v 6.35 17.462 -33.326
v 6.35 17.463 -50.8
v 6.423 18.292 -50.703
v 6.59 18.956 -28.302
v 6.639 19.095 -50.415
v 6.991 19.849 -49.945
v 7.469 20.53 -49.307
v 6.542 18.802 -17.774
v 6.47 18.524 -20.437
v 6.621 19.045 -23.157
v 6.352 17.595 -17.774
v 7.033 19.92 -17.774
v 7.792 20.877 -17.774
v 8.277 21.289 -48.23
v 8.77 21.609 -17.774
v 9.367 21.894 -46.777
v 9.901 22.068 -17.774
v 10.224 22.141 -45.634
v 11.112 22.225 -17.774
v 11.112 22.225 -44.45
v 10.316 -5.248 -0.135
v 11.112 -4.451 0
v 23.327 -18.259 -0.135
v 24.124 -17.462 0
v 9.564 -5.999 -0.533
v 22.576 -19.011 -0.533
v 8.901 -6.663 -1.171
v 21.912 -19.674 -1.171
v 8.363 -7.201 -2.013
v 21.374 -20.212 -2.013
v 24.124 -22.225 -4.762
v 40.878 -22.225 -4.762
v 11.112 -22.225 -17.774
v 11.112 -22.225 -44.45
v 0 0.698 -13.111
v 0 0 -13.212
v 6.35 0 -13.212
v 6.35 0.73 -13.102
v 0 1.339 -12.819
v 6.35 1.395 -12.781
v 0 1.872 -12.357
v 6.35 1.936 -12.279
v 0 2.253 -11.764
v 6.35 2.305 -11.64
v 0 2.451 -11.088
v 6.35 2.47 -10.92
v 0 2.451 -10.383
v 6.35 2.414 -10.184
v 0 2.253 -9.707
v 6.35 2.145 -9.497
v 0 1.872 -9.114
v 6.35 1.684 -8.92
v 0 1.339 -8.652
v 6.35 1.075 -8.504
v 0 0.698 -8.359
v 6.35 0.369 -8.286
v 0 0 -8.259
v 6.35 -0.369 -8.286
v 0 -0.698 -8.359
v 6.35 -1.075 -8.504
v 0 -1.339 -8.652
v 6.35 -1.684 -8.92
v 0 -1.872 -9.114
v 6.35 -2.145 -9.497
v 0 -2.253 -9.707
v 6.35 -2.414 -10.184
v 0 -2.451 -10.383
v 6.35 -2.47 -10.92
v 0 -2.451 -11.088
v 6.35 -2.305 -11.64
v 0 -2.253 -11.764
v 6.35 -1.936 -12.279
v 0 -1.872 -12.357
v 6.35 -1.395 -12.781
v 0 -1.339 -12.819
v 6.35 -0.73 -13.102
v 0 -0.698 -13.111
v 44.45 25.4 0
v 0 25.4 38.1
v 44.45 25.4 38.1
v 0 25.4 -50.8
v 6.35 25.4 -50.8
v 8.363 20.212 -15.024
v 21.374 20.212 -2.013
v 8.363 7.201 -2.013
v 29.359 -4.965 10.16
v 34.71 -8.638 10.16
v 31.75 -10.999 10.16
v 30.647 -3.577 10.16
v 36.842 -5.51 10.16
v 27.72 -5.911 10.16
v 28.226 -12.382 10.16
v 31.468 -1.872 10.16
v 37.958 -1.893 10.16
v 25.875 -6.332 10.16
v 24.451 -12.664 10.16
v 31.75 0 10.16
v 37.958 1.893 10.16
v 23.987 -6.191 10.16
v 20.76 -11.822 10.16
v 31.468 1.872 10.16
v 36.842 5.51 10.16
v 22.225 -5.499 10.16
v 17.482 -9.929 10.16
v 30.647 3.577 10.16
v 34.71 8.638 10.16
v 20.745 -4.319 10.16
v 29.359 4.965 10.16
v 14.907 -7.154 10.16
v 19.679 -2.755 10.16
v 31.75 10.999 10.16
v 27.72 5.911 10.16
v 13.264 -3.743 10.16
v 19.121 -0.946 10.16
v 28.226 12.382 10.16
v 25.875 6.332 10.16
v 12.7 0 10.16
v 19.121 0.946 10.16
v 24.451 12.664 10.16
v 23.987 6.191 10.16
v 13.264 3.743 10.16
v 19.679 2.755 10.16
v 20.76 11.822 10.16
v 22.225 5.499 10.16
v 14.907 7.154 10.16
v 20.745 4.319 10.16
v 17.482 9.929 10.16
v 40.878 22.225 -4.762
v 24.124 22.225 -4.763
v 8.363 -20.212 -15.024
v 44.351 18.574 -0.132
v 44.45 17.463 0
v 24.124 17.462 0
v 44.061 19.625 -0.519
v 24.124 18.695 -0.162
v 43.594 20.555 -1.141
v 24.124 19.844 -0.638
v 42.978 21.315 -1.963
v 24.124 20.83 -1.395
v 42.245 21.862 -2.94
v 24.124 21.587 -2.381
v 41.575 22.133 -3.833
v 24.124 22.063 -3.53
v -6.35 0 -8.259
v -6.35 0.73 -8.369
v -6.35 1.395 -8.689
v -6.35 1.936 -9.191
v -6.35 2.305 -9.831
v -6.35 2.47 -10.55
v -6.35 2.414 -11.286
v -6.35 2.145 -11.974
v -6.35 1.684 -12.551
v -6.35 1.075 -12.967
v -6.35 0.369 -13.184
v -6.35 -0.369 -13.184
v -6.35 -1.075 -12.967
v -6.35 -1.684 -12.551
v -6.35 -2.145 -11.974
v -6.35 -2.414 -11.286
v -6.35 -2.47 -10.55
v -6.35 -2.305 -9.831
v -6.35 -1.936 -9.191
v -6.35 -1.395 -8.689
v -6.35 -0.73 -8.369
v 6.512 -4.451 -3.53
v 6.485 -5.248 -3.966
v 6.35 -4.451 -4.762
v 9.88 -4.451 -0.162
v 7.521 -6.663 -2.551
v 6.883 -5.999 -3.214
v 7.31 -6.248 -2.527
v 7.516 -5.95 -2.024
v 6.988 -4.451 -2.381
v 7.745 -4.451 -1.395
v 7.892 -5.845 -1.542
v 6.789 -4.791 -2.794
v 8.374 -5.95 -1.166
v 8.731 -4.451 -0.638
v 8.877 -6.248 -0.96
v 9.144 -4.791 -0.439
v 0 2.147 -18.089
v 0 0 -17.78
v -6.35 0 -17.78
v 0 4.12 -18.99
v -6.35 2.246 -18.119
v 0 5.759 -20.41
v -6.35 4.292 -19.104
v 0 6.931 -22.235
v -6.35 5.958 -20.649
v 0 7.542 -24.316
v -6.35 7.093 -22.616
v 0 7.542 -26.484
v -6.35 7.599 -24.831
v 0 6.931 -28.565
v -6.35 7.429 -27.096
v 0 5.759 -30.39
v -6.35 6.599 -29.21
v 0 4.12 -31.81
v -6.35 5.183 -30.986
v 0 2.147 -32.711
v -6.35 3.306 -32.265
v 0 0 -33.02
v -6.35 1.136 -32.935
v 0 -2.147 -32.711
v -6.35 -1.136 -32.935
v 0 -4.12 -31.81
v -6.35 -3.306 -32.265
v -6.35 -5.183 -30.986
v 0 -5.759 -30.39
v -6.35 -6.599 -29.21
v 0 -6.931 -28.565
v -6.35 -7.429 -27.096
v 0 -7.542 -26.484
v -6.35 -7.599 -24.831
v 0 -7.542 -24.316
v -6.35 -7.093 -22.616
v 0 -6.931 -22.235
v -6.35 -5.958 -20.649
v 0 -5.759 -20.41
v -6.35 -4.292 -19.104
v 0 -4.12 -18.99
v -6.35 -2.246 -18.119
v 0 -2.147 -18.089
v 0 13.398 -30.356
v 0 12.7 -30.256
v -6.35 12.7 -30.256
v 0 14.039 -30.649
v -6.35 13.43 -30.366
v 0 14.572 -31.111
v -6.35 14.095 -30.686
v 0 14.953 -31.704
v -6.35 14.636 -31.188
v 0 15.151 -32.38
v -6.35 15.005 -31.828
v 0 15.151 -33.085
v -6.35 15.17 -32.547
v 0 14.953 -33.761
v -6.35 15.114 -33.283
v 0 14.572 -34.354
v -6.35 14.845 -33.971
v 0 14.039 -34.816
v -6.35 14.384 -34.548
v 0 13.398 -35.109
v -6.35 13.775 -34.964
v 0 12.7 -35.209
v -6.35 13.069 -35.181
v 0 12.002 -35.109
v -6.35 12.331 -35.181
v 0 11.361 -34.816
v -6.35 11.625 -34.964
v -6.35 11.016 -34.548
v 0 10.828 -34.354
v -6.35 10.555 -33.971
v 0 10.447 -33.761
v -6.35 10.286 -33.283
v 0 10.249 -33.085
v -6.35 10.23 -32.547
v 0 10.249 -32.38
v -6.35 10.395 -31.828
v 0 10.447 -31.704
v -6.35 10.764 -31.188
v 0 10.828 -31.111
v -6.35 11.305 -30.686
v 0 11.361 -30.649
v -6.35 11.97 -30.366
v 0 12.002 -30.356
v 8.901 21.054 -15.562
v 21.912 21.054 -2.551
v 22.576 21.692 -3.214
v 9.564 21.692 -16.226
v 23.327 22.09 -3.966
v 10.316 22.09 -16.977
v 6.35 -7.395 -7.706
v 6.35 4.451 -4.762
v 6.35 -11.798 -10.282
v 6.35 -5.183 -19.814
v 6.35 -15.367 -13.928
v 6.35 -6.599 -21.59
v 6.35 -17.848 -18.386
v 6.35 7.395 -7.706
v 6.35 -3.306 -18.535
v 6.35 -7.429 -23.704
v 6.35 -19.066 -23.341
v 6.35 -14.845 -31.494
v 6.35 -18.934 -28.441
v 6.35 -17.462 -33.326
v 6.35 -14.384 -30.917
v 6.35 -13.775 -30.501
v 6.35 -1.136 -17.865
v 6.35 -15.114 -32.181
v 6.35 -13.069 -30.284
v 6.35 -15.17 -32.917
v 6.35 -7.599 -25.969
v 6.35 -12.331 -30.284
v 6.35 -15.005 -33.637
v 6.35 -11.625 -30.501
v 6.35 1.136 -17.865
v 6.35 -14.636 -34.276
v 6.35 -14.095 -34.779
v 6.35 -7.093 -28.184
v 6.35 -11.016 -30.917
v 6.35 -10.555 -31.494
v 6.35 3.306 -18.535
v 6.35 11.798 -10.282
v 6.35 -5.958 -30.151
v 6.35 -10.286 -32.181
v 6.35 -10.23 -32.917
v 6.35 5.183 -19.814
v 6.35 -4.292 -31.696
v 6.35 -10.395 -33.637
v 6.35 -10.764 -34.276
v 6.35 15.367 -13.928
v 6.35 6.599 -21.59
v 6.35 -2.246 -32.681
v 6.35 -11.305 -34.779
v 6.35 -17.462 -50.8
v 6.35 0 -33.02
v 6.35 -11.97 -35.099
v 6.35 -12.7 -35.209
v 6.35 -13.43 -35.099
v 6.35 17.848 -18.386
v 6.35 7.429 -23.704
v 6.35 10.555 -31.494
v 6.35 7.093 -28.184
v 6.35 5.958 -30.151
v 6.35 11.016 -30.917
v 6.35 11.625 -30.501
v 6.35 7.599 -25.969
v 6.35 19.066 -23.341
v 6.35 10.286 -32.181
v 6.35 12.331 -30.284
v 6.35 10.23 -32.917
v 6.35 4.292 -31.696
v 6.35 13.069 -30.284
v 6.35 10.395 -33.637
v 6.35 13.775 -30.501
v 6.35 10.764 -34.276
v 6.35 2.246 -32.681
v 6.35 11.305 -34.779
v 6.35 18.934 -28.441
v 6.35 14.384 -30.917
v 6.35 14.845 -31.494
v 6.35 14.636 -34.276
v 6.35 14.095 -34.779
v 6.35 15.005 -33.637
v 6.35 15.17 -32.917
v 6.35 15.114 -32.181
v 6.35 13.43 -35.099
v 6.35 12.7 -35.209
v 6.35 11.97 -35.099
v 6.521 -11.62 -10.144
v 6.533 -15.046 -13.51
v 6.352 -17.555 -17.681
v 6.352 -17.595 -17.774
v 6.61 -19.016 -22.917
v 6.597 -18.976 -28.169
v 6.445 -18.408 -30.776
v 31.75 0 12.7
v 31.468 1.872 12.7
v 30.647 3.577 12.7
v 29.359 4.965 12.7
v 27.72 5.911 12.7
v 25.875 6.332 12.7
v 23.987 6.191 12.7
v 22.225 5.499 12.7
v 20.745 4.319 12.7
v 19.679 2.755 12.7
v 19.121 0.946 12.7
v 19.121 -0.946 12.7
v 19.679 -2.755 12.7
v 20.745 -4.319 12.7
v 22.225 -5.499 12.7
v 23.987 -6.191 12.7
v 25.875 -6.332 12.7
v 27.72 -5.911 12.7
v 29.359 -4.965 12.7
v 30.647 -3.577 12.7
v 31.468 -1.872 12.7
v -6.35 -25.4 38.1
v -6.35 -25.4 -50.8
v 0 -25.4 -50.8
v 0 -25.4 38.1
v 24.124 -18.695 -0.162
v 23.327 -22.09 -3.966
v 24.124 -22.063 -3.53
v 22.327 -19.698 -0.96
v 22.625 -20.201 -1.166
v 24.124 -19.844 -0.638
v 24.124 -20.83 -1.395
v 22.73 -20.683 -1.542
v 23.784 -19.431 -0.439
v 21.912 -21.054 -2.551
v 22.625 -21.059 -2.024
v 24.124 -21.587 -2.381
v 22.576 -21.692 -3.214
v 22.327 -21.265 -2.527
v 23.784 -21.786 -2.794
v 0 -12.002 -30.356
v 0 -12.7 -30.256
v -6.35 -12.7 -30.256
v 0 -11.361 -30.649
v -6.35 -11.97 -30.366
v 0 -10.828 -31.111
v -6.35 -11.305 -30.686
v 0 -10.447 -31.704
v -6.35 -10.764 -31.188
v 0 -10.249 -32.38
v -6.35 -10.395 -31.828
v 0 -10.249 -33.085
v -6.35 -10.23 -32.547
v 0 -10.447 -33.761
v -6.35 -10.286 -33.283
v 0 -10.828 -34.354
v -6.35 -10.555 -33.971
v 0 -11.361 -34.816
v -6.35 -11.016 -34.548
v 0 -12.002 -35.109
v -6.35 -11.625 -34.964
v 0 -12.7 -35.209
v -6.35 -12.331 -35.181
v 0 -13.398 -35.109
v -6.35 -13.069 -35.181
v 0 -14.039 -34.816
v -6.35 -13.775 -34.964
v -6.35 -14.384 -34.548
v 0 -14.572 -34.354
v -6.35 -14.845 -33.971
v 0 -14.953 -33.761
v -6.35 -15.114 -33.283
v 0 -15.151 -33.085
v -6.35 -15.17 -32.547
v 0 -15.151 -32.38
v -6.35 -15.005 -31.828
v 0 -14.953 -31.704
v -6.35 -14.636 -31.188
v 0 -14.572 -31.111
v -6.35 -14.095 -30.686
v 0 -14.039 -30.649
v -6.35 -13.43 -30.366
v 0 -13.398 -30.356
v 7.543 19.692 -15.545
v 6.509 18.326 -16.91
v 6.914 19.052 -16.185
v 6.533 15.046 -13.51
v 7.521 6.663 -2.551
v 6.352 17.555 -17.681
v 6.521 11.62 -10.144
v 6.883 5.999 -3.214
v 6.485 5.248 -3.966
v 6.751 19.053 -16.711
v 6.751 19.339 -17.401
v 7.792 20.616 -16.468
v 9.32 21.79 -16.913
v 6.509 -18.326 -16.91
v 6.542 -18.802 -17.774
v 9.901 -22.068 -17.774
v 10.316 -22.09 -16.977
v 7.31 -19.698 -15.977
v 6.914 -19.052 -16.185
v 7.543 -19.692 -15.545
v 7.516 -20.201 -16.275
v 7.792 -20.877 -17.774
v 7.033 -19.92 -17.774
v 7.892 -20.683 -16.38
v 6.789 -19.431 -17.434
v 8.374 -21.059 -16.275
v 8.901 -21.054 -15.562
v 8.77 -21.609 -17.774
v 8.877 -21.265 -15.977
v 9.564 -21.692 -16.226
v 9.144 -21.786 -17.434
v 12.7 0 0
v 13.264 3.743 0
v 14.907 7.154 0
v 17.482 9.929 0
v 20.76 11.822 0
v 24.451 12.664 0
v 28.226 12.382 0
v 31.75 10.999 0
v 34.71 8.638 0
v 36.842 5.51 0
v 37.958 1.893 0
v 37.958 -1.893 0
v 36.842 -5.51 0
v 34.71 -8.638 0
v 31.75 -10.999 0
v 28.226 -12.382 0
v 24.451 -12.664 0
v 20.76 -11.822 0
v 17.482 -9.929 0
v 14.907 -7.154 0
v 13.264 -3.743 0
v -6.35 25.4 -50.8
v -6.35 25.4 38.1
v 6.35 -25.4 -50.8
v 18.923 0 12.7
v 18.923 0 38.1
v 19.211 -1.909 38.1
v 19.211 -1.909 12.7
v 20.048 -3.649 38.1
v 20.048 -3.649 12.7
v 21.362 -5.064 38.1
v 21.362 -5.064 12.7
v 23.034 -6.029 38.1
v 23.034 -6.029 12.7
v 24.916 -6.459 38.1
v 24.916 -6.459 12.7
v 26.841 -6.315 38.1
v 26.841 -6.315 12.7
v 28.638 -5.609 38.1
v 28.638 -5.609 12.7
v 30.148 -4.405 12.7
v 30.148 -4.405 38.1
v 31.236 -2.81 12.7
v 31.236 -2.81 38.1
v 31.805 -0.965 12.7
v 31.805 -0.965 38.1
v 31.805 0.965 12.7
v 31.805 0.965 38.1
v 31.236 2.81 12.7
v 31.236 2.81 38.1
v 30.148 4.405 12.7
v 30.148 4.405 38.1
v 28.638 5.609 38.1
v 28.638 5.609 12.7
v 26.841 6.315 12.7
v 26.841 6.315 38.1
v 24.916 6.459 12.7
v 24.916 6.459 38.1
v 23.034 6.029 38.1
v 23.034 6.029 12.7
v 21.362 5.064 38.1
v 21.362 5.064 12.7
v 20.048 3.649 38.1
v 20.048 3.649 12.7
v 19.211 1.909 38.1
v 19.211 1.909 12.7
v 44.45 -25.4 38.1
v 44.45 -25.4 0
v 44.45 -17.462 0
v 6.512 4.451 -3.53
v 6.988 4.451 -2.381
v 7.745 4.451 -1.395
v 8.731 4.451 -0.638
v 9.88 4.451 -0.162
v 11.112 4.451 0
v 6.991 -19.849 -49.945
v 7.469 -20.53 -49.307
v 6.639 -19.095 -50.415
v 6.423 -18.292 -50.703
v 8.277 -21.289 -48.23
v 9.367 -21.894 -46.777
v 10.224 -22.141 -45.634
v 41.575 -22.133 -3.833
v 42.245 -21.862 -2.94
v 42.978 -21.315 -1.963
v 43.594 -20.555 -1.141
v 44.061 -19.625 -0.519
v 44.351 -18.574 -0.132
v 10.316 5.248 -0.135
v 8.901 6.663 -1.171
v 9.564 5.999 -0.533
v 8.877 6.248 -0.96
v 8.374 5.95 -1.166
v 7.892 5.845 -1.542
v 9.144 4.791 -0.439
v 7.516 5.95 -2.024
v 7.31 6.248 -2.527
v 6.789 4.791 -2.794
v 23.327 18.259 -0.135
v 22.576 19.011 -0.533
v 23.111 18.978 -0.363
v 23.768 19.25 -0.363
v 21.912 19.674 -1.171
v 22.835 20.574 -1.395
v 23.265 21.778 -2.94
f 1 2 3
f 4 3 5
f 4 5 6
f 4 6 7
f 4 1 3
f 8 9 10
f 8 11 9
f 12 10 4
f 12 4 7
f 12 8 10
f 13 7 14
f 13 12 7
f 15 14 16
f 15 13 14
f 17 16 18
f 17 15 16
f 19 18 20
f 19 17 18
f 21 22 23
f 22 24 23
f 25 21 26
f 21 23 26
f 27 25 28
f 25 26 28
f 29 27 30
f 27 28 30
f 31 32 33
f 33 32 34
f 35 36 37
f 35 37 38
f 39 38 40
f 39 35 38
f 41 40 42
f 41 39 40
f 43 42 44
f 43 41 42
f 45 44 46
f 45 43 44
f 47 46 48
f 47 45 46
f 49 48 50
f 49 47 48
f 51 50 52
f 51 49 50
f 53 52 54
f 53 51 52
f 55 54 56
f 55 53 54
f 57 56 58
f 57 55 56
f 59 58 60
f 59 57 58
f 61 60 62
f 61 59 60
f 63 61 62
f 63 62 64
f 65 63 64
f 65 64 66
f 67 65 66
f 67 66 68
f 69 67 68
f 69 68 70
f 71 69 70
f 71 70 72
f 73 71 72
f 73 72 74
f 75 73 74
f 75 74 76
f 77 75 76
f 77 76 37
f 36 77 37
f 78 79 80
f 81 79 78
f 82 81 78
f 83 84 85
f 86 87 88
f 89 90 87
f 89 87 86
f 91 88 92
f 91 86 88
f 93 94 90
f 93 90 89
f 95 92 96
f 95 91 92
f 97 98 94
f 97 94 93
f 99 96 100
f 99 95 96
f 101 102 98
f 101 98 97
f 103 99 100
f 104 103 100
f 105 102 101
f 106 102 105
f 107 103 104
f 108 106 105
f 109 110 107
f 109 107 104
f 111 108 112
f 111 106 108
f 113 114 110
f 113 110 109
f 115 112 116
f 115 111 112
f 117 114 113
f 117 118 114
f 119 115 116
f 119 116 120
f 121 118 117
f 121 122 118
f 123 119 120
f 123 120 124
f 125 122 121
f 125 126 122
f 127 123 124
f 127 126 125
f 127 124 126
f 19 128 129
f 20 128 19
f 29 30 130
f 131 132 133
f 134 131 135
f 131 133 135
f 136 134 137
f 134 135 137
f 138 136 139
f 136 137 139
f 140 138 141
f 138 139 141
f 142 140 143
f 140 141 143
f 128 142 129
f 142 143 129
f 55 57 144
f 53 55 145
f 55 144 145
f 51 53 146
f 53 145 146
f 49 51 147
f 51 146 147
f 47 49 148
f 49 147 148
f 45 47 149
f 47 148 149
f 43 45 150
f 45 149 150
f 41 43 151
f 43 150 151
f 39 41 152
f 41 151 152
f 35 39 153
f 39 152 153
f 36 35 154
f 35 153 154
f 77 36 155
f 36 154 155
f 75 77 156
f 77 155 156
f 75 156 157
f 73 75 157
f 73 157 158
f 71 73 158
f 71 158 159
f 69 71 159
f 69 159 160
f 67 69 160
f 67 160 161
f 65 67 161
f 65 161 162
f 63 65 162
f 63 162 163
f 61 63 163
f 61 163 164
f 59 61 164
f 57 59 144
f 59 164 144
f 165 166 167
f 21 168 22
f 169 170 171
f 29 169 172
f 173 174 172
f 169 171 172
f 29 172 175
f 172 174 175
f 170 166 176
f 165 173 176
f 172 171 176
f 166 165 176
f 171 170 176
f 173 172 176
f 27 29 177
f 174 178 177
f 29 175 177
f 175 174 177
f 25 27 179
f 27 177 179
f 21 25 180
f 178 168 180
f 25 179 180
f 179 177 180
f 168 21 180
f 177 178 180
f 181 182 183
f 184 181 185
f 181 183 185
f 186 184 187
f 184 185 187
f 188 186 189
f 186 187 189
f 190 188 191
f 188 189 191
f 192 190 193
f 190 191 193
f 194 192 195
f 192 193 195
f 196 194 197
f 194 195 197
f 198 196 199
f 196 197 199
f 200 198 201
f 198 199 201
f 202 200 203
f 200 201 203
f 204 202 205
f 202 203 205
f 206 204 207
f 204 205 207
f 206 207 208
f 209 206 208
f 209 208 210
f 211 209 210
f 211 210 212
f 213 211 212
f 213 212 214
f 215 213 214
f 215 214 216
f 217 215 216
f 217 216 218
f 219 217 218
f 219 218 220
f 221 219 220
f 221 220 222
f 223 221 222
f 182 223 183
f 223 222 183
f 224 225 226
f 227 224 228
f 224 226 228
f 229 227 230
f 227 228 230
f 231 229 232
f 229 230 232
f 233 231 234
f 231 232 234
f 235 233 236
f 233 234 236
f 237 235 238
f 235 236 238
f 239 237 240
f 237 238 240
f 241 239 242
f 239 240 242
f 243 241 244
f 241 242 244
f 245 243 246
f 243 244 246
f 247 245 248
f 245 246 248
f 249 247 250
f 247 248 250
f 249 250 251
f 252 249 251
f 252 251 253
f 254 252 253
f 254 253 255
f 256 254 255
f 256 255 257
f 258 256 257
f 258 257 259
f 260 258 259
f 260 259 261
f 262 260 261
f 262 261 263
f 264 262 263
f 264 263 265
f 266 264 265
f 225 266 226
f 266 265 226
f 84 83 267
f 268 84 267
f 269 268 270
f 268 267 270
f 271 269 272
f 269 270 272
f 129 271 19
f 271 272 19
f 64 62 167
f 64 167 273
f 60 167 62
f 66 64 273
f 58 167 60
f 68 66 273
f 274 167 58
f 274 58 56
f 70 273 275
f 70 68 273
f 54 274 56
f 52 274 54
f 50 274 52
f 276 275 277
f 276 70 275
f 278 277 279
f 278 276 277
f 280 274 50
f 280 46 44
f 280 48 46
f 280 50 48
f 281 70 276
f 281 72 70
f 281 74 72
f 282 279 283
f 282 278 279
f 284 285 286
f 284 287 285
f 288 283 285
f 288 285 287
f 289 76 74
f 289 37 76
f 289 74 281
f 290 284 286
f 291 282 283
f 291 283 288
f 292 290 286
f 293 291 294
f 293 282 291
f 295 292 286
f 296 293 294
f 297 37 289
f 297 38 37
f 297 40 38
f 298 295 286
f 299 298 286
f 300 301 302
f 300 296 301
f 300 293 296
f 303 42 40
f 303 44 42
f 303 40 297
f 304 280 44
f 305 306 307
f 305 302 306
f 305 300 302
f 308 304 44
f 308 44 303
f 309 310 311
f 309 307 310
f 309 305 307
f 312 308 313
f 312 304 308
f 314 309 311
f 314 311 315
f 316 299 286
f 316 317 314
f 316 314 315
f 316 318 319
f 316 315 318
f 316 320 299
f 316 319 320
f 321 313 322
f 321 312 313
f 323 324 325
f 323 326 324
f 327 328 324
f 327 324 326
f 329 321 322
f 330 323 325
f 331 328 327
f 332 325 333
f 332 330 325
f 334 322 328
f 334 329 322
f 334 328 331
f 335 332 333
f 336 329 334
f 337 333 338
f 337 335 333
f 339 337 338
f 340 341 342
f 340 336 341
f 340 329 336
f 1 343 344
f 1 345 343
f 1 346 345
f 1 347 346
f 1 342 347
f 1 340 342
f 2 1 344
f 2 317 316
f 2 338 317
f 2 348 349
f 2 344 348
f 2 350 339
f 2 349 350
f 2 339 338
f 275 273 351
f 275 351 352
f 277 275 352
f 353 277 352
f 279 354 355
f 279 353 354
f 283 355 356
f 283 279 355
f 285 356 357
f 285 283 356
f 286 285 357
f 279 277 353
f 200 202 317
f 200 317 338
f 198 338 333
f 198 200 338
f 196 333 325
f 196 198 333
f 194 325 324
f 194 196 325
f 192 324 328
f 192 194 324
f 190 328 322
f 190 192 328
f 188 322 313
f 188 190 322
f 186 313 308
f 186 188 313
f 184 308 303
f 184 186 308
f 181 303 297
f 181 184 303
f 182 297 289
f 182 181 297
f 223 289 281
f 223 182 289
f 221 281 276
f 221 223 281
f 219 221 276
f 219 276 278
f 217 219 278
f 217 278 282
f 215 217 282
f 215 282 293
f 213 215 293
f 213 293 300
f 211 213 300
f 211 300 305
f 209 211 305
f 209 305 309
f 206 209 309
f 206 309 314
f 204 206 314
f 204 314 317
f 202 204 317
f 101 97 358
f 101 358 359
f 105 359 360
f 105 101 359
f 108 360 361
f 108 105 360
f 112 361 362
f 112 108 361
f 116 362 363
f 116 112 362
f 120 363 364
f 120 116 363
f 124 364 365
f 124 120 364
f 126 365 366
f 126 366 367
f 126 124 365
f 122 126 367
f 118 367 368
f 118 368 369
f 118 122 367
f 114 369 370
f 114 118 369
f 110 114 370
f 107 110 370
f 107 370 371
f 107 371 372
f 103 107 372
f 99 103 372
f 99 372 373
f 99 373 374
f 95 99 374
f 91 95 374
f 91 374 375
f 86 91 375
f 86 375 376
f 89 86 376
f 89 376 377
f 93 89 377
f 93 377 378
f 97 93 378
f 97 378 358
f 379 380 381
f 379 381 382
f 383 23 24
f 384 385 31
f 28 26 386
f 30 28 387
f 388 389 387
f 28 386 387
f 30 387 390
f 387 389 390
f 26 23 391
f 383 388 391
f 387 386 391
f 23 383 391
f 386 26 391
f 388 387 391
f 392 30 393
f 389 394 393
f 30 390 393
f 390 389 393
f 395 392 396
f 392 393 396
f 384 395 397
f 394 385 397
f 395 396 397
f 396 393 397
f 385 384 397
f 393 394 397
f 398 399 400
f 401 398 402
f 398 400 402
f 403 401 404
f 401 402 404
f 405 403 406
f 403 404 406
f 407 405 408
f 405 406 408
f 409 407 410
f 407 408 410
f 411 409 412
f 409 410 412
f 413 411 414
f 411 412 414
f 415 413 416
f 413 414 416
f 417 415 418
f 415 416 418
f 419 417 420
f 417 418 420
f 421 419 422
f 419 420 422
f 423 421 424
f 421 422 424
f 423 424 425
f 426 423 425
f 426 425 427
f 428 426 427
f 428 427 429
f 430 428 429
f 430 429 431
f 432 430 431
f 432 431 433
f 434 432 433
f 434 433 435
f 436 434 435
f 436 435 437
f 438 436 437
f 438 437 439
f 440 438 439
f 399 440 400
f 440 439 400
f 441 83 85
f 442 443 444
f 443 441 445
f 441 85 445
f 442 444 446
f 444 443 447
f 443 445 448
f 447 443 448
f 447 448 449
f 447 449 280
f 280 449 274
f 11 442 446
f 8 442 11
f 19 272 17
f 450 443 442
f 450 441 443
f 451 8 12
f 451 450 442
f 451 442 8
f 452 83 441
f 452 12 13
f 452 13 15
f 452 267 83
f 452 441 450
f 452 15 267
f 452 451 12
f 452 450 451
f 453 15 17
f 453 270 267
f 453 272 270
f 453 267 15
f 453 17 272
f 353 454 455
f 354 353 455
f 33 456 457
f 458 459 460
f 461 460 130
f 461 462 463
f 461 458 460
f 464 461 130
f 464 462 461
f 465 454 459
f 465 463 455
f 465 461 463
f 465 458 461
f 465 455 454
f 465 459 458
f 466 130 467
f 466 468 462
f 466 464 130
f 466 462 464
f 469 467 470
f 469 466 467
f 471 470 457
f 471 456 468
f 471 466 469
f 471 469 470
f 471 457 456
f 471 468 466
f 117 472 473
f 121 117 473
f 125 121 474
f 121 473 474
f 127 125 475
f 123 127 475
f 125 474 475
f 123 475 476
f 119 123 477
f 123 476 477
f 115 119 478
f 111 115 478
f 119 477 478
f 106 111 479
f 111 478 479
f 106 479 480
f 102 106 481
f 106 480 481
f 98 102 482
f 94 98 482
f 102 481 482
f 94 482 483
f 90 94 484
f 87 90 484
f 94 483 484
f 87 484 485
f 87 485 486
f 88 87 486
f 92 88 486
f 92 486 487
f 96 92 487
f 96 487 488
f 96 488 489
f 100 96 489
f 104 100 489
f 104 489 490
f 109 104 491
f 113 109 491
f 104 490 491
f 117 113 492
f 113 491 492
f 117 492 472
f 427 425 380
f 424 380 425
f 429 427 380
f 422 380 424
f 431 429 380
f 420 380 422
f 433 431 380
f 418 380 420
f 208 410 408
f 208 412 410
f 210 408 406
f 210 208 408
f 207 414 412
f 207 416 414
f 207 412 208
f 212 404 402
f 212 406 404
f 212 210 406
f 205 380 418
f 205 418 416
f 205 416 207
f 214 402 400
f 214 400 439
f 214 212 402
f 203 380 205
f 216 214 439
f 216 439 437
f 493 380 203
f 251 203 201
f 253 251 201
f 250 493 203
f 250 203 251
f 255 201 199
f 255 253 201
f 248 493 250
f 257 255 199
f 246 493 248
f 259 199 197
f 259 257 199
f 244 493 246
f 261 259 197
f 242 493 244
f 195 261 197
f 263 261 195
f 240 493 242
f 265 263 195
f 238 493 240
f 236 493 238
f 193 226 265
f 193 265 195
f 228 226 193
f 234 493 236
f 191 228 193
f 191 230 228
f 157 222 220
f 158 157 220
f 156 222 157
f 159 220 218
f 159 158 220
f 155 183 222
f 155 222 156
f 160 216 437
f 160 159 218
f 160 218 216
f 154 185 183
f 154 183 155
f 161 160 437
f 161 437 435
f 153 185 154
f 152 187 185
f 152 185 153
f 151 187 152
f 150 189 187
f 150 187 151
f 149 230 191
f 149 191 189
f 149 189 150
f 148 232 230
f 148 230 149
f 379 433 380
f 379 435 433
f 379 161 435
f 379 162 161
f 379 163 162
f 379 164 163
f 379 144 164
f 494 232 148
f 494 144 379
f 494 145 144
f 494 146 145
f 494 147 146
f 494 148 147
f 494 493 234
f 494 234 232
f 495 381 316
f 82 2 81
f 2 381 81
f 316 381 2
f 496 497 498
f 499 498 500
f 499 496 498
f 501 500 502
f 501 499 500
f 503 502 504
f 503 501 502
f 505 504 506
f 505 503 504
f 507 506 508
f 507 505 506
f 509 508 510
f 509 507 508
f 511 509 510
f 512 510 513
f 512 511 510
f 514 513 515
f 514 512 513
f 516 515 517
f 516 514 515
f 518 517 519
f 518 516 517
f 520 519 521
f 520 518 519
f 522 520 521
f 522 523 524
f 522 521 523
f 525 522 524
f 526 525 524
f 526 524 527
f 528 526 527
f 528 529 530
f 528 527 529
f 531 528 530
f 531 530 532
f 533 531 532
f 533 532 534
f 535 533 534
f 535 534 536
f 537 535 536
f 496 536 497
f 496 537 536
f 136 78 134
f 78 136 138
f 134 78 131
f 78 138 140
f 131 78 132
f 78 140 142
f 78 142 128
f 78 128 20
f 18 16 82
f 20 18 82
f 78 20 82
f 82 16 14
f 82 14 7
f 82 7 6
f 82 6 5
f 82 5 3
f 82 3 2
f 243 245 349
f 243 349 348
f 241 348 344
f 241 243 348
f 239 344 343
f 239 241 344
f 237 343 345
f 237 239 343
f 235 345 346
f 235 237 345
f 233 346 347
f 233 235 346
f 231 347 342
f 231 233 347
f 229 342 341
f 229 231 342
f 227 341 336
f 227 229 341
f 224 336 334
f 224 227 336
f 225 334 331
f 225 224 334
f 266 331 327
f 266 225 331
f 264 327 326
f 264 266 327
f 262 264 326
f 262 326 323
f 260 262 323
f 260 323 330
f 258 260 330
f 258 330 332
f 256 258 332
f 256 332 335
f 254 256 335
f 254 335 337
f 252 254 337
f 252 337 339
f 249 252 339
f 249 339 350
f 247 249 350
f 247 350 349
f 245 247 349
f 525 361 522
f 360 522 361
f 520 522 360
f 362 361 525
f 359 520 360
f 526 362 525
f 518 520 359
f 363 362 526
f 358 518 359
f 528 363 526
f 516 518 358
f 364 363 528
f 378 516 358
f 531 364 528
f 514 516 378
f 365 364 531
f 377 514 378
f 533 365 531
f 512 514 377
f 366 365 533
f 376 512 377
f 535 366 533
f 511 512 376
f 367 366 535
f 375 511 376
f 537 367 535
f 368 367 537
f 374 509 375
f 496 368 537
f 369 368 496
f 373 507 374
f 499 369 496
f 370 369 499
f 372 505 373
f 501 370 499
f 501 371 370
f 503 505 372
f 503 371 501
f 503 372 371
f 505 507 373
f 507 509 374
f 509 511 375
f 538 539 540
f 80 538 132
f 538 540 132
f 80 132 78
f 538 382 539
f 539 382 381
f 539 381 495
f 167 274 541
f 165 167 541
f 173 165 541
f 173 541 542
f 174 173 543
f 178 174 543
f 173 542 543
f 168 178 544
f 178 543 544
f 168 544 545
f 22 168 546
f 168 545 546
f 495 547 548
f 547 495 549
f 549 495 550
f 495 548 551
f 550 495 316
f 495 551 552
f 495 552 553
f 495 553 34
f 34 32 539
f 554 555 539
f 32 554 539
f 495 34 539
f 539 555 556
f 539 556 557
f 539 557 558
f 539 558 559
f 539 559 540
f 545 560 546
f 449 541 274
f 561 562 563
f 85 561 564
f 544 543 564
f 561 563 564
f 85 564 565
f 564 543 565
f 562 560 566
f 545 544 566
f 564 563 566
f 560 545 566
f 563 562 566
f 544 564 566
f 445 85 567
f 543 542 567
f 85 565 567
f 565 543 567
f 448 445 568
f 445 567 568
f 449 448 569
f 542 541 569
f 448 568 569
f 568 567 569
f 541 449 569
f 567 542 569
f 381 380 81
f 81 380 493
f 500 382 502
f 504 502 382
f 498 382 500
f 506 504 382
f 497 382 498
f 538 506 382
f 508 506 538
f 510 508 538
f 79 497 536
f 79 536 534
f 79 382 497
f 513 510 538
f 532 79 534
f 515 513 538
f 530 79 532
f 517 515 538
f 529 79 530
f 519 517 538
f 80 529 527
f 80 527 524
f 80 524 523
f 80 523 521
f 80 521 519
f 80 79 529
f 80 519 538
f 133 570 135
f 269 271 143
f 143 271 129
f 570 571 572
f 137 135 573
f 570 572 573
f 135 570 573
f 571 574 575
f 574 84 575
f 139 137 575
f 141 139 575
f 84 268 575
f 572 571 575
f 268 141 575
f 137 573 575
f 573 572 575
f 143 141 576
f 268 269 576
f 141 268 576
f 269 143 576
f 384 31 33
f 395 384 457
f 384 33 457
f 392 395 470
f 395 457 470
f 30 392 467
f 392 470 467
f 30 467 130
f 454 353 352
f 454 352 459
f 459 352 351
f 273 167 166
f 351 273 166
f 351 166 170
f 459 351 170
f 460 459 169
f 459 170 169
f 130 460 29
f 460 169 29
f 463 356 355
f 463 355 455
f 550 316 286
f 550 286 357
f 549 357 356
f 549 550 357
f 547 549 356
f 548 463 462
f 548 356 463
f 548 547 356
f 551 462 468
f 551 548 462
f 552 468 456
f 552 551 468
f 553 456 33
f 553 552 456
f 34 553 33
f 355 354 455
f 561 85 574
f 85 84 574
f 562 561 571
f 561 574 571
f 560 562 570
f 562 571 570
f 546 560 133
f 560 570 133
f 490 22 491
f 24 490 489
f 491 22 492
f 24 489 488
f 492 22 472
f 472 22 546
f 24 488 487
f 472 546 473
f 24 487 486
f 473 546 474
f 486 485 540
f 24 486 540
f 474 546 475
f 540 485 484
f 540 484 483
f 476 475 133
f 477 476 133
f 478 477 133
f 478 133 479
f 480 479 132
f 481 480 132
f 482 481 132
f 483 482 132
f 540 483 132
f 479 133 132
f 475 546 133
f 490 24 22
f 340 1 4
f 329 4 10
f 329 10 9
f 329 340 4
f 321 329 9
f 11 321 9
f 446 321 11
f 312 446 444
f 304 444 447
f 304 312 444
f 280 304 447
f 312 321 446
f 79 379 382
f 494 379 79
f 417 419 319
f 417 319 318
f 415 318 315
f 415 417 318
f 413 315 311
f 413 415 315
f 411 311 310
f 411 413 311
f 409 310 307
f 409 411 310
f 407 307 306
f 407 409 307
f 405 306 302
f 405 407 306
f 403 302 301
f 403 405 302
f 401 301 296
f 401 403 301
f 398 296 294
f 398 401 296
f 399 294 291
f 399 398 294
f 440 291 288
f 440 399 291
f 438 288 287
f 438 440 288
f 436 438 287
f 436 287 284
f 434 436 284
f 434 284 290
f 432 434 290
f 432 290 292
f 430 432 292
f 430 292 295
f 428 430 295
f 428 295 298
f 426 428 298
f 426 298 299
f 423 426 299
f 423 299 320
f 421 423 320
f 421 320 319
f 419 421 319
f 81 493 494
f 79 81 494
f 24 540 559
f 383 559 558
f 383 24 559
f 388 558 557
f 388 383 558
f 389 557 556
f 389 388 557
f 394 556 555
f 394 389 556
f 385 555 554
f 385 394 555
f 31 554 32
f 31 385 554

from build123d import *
from build123d.topology import SkipClean

# Parameters (mm, degrees)
SKETCH2_W           = 50.8
SKETCH2_H           = 50.8
SKETCH2_R           = 7.62
SKETCH2_R_2         = 2.4765
BOSS_EXTRUDE1_DEPTH = 6.35
SKETCH3_W           = 44.45
SKETCH3_H           = 50.8
SKETCH3_R           = 6.35
BOSS_EXTRUDE2_DEPTH = 12.7
SKETCH9_R           = 12.7
CUT_EXTRUDE2_DEPTH  = 10.16
RIB8_REACH          = 86.481
SKETCH13_WALL_W     = 234.462510634
SKETCH13_WALL_H     = 3.175
RIB9_REACH          = 86.481
SKETCH14_WALL_W     = 234.462510634
SKETCH14_WALL_H     = 3.175
BOSS_EXTRUDE5_REACH = 73.113
FILLET2_R           = 4.7625
SKETCH22_W          = 44.45
SKETCH22_H          = 50.8
BOSS_EXTRUDE6_DEPTH = 25.4
SKETCH20_R          = 6.477
CUT_EXTRUDE3_DEPTH  = 50.8
SKETCH23_R          = 19.177
CUT_EXTRUDE4_DEPTH  = 15.494
BOSS_EXTRUDE7_START = 6.35
SKETCH25_W          = 88.9
SKETCH25_H          = 50.8
SKETCH25_R          = 2.4765
SKETCH25_R_2        = 7.62
BOSS_EXTRUDE7_DEPTH = 6.35


with BuildPart() as part:
    # Sketch2 → Boss-Extrude1 (new body)
    with BuildSketch(Plane(origin=(0, 0, 0), x_dir=(0, 0, -1), z_dir=(1, 0, 0))):
        with Locations((25.4, 0)):
            Rectangle(SKETCH2_W, SKETCH2_H)
        with Locations((25.4, 0)):
            Circle(SKETCH2_R, mode=Mode.SUBTRACT)
        with Locations((32.732348419, 12.7)):
            Circle(SKETCH2_R_2, mode=Mode.SUBTRACT)
        with Locations((32.732348419, -12.7)):
            Circle(SKETCH2_R_2, mode=Mode.SUBTRACT)
        with Locations((10.735303163, 0)):
            Circle(SKETCH2_R_2, mode=Mode.SUBTRACT)
    extrude(amount=BOSS_EXTRUDE1_DEPTH)

    # Sketch3 → Boss-Extrude2 (add)
    with BuildSketch(Plane.XY):
        with Locations((22.225, 0)):
            Rectangle(SKETCH3_W, SKETCH3_H)
        with Locations((25.4, 0)):
            Circle(SKETCH3_R, mode=Mode.SUBTRACT)
    extrude(amount=BOSS_EXTRUDE2_DEPTH)

    # Sketch9 → Cut-Extrude2 (cut)
    with BuildSketch(Plane(origin=(0, 0, 0), x_dir=(-1, 0, 0), z_dir=(0, 0, -1))):
        with Locations((-25.4, 0)):
            Circle(SKETCH9_R)
    extrude(amount=-CUT_EXTRUDE2_DEPTH, mode=Mode.SUBTRACT)

    # Sketch13 wall → Rib8 (add, up to next)
    with BuildSketch(Plane(origin=(25.4, 25.4, -25.4), x_dir=(-0.6, 0, -0.8), z_dir=(-0.8, 0, 0.6)), mode=Mode.PRIVATE) as rib8_sk1:
        with Locations((0, 1.5875)):
            Rectangle(SKETCH13_WALL_W, SKETCH13_WALL_H)
    rib8_tool1 = extrude(rib8_sk1.sketch, amount=RIB8_REACH, mode=Mode.PRIVATE) - part.part
    add(rib8_tool1.solids().sort_by_distance((25.4, 25.4, -25.4))[0])

    # Sketch14 wall → Rib9 (add, up to next)
    with BuildSketch(Plane(origin=(25.4, -25.4, -25.4), x_dir=(-0.6, 0, -0.8), z_dir=(0.8, 0, -0.6)), mode=Mode.PRIVATE) as rib9_sk1:
        with Locations((0, 1.5875)):
            Rectangle(SKETCH14_WALL_W, SKETCH14_WALL_H)
    rib9_tool1 = extrude(rib9_sk1.sketch, amount=-RIB9_REACH, mode=Mode.PRIVATE) - part.part
    add(rib9_tool1.solids().sort_by_distance((25.4, -25.4, -25.4))[0])

    # Sketch17 → Boss-Extrude5 (add, up to next)
    with BuildSketch(Plane(origin=(1.058333333, 1.058333333, -1.058333333), x_dir=(0.8164965809277261, -0.408248290463863, 0.408248290463863), z_dir=(-0.5773502691896257, -0.5773502691896258, 0.5773502691896258)), mode=Mode.PRIVATE) as boss_extrude5_sk1:
        Polygon((6.480941611, -29.185832393), (6.480941611, -2.24506403), (29.812331411, -15.715448212), align=None)
    boss_extrude5_tool1 = extrude(boss_extrude5_sk1.sketch, amount=BOSS_EXTRUDE5_REACH, mode=Mode.PRIVATE) - part.part
    boss_extrude5 = boss_extrude5_tool1.solids().sort_by_distance((12.7, -15.875, -6.35))[0]
    add(boss_extrude5)

    # Mirror1: Boss-Extrude5 across plane
    add(boss_extrude5.mirror(Plane.ZX))

    # Fillet2
    fillet2_edges = [part.edges().sort_by_distance(p)[0] for p in [
        (34.925, 22.225, 0),
        (6.35, 22.225, -34.925),
        (6.35, -22.225, -34.925),
        (34.925, -22.225, 0),
        (6.35, 0, 0),
        (15.875, 22.225, -9.525),
        (15.875, 12.7, 0),
        (6.35, 12.7, -9.525),
        (6.35, -12.7, -9.525),
        (15.875, -22.225, -9.525),
        (15.875, -12.7, 0),
    ]]
    fillet(fillet2_edges, radius=FILLET2_R)

    # Sketch22 → Boss-Extrude6 (add)
    with BuildSketch(Plane.XY.offset(12.7)):
        with Locations((22.225, 0)):
            Rectangle(SKETCH22_W, SKETCH22_H)
    extrude(amount=BOSS_EXTRUDE6_DEPTH)

    # Sketch20 → Cut-Extrude3 (cut)
    with BuildSketch(Plane.XY.offset(12.7)):
        with Locations((25.4, 0)):
            Circle(SKETCH20_R)
    extrude(amount=CUT_EXTRUDE3_DEPTH, mode=Mode.SUBTRACT)

    # Sketch23 → Cut-Extrude4 (cut)
    with BuildSketch(Plane(origin=(6.35, 0, 0), x_dir=(0, 0, -1), z_dir=(1, 0, 0))):
        with Locations((25.4, 0)):
            Circle(SKETCH23_R)
    extrude(amount=CUT_EXTRUDE4_DEPTH, mode=Mode.SUBTRACT)

    # Sketch25 → Boss-Extrude7 (add)
    with SkipClean():  # the faces are left unmerged after this step: merging them gives an invalid solid
        with BuildSketch(Plane.ZY.offset(BOSS_EXTRUDE7_START)):
            with Locations((-6.35, 0)):
                Rectangle(SKETCH25_W, SKETCH25_H)
            with Locations((-32.732348419, -12.7)):
                Circle(SKETCH25_R, mode=Mode.SUBTRACT)
            with Locations((-10.735303163, 0)):
                Circle(SKETCH25_R, mode=Mode.SUBTRACT)
            with Locations((-32.732348419, 12.7)):
                Circle(SKETCH25_R, mode=Mode.SUBTRACT)
            with Locations((-25.4, 0)):
                Circle(SKETCH25_R_2, mode=Mode.SUBTRACT)
        extrude(amount=-BOSS_EXTRUDE7_DEPTH)


solid = part.part
